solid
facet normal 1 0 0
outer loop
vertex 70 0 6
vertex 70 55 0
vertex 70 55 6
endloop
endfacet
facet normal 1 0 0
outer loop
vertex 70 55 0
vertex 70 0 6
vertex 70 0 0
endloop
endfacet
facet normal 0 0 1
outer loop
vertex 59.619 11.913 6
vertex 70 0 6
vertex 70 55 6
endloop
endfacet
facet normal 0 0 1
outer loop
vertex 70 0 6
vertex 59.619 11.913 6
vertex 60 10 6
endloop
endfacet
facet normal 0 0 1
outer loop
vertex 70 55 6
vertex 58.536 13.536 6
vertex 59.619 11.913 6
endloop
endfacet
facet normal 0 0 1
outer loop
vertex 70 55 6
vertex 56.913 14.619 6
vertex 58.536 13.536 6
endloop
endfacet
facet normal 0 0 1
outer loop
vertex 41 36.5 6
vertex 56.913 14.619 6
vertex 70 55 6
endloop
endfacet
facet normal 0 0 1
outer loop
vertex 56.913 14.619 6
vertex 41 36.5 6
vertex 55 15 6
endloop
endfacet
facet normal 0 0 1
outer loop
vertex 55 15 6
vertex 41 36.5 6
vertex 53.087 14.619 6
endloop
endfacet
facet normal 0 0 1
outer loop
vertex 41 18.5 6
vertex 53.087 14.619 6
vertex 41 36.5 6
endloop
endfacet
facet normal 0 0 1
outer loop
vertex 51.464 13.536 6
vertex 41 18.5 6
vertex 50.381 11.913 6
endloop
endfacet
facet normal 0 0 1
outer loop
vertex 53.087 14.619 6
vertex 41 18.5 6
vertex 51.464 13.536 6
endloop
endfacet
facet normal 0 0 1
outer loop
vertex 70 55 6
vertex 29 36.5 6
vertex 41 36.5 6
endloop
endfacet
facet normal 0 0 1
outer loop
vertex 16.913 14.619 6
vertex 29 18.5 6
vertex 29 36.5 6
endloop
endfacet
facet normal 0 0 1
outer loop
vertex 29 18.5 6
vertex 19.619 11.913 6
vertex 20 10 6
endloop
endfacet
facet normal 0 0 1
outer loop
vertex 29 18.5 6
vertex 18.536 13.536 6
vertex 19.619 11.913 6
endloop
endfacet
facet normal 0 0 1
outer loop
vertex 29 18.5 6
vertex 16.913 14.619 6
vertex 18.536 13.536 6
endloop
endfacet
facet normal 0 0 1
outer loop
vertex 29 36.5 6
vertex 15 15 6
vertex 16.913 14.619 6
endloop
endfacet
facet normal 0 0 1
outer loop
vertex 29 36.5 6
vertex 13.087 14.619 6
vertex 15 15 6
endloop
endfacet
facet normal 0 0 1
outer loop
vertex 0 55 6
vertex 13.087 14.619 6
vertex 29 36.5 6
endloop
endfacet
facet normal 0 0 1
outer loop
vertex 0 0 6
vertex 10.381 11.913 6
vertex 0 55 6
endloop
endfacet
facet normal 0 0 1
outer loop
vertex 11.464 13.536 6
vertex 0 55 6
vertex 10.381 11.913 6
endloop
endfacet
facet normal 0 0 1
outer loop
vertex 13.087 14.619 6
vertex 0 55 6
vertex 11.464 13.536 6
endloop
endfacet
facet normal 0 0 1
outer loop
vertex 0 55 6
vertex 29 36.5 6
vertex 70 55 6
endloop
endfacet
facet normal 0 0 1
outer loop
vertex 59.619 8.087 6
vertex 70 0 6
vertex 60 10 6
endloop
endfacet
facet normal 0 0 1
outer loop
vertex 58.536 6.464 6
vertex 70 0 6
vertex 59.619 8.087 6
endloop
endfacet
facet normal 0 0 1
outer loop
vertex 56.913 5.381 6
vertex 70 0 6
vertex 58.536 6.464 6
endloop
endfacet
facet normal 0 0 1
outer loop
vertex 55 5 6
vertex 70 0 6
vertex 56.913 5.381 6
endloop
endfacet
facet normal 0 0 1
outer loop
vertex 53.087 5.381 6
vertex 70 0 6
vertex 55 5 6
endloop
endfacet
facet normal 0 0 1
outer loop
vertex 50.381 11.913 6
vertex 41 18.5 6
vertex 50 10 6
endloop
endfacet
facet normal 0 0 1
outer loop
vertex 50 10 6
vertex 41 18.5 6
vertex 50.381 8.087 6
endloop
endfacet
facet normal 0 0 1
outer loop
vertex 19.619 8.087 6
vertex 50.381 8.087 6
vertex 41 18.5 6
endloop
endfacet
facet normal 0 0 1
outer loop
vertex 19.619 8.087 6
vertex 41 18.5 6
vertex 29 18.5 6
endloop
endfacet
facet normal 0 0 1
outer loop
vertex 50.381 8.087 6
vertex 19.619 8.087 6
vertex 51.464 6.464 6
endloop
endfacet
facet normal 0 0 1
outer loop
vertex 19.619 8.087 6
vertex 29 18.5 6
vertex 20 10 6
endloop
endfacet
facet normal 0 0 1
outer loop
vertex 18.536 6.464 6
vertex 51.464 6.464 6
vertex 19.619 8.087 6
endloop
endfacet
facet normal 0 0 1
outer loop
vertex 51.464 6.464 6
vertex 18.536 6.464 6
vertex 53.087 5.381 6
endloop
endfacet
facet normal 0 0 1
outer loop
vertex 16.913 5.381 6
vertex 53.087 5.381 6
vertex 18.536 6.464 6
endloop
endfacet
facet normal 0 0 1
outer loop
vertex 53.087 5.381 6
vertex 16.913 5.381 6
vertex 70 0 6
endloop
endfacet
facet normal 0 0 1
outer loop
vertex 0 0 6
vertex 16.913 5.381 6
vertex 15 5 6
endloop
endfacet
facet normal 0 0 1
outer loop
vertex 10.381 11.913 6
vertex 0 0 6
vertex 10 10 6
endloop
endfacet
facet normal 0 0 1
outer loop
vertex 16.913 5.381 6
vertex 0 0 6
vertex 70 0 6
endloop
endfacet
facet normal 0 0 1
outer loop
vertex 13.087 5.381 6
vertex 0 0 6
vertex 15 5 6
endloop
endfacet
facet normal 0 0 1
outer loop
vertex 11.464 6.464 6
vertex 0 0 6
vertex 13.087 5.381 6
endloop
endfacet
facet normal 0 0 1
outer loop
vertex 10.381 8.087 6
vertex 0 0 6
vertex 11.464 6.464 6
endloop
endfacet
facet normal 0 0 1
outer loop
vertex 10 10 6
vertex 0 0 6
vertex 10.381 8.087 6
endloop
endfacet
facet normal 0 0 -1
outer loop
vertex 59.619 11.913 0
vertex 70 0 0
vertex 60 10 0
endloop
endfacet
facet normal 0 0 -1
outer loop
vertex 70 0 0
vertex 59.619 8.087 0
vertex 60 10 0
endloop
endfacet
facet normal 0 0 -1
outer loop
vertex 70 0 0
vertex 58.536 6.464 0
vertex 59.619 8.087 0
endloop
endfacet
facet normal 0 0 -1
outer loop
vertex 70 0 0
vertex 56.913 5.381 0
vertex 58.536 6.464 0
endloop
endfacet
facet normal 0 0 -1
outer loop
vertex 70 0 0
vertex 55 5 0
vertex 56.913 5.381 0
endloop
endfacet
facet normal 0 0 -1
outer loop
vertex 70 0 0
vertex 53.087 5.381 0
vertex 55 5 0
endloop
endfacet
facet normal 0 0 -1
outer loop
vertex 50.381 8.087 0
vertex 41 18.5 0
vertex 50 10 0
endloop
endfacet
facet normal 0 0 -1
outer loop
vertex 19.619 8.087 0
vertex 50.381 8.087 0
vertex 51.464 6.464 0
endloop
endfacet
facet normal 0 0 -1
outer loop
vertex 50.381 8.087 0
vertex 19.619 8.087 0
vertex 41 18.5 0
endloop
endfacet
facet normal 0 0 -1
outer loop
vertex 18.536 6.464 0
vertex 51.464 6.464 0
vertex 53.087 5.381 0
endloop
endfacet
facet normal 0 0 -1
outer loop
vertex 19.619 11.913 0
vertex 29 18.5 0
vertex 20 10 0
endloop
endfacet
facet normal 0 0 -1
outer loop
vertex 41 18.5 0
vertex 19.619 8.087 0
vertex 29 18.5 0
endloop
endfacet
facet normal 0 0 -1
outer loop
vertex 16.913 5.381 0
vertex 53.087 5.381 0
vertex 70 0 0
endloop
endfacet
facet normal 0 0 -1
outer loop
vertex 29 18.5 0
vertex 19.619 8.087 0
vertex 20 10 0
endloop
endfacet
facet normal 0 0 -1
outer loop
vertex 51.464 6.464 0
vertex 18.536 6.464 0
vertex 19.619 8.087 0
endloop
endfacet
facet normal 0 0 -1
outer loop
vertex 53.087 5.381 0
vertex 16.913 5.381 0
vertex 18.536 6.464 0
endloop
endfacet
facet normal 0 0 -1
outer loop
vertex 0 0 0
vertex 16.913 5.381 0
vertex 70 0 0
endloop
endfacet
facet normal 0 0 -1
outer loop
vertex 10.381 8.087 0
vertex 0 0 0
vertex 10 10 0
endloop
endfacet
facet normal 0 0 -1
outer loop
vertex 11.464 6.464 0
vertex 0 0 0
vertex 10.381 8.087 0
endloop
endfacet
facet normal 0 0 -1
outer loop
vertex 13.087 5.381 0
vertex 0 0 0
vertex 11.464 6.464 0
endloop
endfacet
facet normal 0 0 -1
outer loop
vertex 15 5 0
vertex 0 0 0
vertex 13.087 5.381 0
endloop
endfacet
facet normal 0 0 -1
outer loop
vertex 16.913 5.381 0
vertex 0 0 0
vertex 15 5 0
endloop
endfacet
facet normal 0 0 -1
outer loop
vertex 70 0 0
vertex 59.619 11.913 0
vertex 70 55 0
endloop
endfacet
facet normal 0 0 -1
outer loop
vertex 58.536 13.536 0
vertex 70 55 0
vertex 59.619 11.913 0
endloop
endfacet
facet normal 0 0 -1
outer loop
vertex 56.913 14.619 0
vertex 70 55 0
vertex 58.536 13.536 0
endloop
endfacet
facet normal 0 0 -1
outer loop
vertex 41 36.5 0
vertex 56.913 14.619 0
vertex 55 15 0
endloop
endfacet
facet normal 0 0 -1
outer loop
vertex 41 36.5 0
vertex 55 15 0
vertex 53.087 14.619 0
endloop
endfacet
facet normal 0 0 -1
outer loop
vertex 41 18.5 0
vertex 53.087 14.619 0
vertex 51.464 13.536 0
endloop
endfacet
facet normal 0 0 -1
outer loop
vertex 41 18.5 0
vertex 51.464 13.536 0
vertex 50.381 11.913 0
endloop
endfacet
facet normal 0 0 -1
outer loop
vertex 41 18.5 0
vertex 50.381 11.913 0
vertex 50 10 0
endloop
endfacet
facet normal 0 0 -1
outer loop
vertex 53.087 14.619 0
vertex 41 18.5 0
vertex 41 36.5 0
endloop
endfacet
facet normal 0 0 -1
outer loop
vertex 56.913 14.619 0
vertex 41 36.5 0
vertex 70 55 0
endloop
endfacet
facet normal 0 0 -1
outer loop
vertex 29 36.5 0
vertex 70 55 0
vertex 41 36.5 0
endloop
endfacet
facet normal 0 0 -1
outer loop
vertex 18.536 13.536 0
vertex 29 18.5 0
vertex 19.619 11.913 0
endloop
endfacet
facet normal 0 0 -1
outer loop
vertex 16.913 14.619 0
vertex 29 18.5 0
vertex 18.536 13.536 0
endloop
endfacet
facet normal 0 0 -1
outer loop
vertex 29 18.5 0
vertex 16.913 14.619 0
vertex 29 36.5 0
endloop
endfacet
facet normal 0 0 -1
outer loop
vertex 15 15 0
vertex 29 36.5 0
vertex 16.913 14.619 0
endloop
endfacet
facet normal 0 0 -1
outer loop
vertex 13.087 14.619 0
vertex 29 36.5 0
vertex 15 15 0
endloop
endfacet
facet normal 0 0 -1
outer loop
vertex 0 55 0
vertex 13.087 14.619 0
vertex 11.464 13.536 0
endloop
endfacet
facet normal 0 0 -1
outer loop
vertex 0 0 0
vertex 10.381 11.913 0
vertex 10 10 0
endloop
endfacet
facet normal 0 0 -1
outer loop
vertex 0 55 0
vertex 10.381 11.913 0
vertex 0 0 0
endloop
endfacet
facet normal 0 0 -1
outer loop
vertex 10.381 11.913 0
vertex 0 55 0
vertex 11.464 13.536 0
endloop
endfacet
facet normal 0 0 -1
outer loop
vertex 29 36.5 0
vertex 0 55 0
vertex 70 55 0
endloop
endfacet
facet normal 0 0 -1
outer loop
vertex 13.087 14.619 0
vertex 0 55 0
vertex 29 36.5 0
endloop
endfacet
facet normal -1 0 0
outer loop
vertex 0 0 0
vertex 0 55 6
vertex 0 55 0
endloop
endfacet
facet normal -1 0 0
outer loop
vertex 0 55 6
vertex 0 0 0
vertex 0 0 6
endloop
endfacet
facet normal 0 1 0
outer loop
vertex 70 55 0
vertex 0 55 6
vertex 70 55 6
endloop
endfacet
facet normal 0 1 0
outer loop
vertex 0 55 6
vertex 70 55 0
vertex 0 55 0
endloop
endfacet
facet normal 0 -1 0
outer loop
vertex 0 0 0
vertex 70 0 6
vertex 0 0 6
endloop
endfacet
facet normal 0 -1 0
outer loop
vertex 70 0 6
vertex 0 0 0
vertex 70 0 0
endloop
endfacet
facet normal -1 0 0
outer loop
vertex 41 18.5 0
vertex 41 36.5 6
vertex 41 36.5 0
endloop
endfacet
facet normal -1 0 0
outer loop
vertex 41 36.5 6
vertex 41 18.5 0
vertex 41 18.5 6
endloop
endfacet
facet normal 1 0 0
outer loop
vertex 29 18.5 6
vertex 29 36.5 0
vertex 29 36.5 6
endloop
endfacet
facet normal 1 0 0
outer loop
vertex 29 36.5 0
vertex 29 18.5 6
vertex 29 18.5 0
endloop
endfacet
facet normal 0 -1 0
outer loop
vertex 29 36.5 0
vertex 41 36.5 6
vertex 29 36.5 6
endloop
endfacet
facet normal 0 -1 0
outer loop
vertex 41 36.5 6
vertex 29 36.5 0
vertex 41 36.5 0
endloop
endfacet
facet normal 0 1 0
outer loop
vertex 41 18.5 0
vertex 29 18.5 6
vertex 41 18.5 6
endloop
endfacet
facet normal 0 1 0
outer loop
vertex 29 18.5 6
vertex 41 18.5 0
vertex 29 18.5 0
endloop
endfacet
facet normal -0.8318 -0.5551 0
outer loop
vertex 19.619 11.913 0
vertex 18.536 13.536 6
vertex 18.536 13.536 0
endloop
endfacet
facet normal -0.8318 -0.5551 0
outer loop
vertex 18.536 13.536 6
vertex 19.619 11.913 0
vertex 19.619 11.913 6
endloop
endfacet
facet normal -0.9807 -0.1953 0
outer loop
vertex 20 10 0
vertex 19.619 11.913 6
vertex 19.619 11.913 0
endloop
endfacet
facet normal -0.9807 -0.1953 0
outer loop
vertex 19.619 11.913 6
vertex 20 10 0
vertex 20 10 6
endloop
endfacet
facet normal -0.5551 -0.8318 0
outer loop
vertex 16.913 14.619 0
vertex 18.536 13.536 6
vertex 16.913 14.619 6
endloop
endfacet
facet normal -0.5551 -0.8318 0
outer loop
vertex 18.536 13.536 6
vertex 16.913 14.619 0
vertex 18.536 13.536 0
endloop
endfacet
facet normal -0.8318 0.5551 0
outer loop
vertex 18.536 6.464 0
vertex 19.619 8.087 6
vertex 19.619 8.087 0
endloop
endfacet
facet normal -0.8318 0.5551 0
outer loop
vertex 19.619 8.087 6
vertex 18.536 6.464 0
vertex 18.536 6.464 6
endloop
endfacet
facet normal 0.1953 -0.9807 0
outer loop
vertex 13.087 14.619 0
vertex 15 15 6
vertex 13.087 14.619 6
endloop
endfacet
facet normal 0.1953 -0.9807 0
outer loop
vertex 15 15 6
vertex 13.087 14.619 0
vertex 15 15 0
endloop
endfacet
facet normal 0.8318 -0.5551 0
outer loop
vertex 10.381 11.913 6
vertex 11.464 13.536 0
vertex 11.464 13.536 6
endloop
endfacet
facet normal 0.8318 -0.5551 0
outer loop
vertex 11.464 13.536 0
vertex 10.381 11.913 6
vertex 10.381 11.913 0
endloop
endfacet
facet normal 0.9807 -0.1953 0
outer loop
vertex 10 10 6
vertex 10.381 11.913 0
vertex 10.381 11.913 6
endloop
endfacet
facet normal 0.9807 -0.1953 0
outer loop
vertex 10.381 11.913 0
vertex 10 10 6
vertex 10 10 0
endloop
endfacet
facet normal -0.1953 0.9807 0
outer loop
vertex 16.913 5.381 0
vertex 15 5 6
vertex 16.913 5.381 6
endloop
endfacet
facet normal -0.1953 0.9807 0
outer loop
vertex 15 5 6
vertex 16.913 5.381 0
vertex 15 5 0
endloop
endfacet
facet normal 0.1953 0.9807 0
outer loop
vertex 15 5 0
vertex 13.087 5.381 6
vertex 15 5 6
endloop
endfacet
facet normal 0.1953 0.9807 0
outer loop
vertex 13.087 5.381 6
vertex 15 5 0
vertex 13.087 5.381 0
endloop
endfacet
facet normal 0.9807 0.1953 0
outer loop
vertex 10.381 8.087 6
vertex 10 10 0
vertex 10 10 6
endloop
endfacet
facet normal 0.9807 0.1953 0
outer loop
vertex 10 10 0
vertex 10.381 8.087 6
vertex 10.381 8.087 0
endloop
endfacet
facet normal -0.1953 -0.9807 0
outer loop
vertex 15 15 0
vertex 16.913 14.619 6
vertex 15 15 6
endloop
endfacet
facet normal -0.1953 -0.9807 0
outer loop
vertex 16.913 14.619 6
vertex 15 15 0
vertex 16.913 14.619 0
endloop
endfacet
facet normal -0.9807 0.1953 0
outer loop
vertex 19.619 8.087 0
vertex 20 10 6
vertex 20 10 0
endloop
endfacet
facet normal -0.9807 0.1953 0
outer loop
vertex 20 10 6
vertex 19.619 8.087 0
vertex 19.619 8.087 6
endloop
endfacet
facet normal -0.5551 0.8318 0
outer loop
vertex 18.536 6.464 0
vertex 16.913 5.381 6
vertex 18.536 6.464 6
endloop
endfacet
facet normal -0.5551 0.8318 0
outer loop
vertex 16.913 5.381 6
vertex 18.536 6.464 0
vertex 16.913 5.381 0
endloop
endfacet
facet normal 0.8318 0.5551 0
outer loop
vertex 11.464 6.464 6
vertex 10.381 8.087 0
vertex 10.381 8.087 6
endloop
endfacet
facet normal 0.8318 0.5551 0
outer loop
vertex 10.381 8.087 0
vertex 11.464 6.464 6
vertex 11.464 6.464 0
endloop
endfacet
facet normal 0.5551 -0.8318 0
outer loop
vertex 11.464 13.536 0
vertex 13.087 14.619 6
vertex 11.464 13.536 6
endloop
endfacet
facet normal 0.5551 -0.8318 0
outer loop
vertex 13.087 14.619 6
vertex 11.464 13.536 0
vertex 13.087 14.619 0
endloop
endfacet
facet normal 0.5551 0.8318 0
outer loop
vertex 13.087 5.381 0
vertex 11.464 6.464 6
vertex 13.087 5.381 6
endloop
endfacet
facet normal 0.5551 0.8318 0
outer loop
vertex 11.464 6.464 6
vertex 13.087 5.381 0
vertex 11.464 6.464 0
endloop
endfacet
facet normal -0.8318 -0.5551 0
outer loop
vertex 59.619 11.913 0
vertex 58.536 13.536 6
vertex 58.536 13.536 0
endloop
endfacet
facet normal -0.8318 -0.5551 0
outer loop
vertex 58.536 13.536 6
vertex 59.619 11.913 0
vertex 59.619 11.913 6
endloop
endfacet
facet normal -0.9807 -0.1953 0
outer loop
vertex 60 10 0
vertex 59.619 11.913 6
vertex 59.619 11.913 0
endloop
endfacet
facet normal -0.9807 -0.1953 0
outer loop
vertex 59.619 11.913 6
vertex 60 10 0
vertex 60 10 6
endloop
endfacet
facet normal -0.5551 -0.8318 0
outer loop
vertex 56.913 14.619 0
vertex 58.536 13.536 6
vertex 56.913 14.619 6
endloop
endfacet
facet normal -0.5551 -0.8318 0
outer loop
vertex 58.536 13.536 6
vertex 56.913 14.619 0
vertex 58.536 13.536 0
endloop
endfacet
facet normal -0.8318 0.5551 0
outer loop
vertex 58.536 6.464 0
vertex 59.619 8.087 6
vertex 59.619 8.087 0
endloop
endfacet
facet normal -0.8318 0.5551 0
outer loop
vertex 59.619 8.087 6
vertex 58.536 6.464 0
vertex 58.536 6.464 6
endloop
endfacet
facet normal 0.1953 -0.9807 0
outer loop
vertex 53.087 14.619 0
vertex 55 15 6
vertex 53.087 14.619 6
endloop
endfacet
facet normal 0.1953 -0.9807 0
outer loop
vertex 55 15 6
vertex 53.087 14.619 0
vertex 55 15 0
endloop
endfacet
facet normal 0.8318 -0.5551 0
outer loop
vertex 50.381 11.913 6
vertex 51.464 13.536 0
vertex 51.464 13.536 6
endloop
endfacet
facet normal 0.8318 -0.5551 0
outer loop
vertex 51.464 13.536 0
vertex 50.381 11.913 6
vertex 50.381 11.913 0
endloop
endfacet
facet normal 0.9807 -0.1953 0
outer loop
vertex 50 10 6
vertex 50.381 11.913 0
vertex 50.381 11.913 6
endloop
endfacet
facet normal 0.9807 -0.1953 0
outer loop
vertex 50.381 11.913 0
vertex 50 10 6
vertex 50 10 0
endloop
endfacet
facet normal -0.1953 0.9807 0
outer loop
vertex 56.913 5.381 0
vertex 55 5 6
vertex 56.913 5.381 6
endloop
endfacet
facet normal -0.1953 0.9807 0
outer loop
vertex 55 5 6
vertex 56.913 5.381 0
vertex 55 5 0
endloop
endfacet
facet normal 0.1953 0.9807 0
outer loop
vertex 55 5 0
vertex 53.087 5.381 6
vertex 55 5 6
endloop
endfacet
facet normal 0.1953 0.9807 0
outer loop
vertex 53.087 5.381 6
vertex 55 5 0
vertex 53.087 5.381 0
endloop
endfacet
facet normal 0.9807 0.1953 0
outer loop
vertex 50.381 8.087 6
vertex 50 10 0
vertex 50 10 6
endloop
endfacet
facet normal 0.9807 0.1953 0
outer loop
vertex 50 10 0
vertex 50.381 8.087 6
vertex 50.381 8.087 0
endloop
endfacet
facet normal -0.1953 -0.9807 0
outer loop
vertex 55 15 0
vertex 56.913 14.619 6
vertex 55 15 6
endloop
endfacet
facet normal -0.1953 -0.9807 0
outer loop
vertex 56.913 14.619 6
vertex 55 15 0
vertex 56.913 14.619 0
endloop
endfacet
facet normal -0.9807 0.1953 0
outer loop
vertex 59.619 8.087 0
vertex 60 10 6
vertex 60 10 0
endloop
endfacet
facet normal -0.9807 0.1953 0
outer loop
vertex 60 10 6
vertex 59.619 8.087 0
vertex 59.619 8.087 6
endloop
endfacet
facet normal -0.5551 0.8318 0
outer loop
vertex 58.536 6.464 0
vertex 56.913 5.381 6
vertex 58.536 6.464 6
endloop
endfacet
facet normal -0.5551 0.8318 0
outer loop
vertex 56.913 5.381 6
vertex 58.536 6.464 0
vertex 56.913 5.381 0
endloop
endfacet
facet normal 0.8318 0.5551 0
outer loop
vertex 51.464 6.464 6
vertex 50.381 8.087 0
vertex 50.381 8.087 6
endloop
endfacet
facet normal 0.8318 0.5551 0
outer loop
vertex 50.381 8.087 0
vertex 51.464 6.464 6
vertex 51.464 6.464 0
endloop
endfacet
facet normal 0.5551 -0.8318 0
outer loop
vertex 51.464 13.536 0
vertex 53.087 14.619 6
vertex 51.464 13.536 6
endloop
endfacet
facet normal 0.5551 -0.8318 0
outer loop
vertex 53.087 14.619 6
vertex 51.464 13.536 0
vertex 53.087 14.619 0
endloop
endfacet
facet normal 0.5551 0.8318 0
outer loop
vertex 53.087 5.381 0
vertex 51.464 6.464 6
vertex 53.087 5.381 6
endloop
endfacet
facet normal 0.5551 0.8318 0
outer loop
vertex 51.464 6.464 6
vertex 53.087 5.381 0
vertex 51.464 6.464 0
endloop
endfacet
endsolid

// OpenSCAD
module idler_mount() {
  plate_w = 70.0;
  plate_h = 55.0;
  t = 6.0;
  difference() {
    cube([plate_w, plate_h, t], center=false);
    translate([plate_w/2 - 12.0/2, plate_h/2 - 18.0/2, -1]) cube([12.0, 18.0, t+2], center=false);
    translate([plate_w/2, plate_h/2, -1]) cylinder(h=t+2, d=5.2, center=false);
    translate([plate_w/2 - 40.0/2, 10.0, -1]) cylinder(h=t+2, d=10.0, center=false);
    translate([plate_w/2 + 40.0/2, 10.0, -1]) cylinder(h=t+2, d=10.0, center=false);
  }
}
idler_mount();
